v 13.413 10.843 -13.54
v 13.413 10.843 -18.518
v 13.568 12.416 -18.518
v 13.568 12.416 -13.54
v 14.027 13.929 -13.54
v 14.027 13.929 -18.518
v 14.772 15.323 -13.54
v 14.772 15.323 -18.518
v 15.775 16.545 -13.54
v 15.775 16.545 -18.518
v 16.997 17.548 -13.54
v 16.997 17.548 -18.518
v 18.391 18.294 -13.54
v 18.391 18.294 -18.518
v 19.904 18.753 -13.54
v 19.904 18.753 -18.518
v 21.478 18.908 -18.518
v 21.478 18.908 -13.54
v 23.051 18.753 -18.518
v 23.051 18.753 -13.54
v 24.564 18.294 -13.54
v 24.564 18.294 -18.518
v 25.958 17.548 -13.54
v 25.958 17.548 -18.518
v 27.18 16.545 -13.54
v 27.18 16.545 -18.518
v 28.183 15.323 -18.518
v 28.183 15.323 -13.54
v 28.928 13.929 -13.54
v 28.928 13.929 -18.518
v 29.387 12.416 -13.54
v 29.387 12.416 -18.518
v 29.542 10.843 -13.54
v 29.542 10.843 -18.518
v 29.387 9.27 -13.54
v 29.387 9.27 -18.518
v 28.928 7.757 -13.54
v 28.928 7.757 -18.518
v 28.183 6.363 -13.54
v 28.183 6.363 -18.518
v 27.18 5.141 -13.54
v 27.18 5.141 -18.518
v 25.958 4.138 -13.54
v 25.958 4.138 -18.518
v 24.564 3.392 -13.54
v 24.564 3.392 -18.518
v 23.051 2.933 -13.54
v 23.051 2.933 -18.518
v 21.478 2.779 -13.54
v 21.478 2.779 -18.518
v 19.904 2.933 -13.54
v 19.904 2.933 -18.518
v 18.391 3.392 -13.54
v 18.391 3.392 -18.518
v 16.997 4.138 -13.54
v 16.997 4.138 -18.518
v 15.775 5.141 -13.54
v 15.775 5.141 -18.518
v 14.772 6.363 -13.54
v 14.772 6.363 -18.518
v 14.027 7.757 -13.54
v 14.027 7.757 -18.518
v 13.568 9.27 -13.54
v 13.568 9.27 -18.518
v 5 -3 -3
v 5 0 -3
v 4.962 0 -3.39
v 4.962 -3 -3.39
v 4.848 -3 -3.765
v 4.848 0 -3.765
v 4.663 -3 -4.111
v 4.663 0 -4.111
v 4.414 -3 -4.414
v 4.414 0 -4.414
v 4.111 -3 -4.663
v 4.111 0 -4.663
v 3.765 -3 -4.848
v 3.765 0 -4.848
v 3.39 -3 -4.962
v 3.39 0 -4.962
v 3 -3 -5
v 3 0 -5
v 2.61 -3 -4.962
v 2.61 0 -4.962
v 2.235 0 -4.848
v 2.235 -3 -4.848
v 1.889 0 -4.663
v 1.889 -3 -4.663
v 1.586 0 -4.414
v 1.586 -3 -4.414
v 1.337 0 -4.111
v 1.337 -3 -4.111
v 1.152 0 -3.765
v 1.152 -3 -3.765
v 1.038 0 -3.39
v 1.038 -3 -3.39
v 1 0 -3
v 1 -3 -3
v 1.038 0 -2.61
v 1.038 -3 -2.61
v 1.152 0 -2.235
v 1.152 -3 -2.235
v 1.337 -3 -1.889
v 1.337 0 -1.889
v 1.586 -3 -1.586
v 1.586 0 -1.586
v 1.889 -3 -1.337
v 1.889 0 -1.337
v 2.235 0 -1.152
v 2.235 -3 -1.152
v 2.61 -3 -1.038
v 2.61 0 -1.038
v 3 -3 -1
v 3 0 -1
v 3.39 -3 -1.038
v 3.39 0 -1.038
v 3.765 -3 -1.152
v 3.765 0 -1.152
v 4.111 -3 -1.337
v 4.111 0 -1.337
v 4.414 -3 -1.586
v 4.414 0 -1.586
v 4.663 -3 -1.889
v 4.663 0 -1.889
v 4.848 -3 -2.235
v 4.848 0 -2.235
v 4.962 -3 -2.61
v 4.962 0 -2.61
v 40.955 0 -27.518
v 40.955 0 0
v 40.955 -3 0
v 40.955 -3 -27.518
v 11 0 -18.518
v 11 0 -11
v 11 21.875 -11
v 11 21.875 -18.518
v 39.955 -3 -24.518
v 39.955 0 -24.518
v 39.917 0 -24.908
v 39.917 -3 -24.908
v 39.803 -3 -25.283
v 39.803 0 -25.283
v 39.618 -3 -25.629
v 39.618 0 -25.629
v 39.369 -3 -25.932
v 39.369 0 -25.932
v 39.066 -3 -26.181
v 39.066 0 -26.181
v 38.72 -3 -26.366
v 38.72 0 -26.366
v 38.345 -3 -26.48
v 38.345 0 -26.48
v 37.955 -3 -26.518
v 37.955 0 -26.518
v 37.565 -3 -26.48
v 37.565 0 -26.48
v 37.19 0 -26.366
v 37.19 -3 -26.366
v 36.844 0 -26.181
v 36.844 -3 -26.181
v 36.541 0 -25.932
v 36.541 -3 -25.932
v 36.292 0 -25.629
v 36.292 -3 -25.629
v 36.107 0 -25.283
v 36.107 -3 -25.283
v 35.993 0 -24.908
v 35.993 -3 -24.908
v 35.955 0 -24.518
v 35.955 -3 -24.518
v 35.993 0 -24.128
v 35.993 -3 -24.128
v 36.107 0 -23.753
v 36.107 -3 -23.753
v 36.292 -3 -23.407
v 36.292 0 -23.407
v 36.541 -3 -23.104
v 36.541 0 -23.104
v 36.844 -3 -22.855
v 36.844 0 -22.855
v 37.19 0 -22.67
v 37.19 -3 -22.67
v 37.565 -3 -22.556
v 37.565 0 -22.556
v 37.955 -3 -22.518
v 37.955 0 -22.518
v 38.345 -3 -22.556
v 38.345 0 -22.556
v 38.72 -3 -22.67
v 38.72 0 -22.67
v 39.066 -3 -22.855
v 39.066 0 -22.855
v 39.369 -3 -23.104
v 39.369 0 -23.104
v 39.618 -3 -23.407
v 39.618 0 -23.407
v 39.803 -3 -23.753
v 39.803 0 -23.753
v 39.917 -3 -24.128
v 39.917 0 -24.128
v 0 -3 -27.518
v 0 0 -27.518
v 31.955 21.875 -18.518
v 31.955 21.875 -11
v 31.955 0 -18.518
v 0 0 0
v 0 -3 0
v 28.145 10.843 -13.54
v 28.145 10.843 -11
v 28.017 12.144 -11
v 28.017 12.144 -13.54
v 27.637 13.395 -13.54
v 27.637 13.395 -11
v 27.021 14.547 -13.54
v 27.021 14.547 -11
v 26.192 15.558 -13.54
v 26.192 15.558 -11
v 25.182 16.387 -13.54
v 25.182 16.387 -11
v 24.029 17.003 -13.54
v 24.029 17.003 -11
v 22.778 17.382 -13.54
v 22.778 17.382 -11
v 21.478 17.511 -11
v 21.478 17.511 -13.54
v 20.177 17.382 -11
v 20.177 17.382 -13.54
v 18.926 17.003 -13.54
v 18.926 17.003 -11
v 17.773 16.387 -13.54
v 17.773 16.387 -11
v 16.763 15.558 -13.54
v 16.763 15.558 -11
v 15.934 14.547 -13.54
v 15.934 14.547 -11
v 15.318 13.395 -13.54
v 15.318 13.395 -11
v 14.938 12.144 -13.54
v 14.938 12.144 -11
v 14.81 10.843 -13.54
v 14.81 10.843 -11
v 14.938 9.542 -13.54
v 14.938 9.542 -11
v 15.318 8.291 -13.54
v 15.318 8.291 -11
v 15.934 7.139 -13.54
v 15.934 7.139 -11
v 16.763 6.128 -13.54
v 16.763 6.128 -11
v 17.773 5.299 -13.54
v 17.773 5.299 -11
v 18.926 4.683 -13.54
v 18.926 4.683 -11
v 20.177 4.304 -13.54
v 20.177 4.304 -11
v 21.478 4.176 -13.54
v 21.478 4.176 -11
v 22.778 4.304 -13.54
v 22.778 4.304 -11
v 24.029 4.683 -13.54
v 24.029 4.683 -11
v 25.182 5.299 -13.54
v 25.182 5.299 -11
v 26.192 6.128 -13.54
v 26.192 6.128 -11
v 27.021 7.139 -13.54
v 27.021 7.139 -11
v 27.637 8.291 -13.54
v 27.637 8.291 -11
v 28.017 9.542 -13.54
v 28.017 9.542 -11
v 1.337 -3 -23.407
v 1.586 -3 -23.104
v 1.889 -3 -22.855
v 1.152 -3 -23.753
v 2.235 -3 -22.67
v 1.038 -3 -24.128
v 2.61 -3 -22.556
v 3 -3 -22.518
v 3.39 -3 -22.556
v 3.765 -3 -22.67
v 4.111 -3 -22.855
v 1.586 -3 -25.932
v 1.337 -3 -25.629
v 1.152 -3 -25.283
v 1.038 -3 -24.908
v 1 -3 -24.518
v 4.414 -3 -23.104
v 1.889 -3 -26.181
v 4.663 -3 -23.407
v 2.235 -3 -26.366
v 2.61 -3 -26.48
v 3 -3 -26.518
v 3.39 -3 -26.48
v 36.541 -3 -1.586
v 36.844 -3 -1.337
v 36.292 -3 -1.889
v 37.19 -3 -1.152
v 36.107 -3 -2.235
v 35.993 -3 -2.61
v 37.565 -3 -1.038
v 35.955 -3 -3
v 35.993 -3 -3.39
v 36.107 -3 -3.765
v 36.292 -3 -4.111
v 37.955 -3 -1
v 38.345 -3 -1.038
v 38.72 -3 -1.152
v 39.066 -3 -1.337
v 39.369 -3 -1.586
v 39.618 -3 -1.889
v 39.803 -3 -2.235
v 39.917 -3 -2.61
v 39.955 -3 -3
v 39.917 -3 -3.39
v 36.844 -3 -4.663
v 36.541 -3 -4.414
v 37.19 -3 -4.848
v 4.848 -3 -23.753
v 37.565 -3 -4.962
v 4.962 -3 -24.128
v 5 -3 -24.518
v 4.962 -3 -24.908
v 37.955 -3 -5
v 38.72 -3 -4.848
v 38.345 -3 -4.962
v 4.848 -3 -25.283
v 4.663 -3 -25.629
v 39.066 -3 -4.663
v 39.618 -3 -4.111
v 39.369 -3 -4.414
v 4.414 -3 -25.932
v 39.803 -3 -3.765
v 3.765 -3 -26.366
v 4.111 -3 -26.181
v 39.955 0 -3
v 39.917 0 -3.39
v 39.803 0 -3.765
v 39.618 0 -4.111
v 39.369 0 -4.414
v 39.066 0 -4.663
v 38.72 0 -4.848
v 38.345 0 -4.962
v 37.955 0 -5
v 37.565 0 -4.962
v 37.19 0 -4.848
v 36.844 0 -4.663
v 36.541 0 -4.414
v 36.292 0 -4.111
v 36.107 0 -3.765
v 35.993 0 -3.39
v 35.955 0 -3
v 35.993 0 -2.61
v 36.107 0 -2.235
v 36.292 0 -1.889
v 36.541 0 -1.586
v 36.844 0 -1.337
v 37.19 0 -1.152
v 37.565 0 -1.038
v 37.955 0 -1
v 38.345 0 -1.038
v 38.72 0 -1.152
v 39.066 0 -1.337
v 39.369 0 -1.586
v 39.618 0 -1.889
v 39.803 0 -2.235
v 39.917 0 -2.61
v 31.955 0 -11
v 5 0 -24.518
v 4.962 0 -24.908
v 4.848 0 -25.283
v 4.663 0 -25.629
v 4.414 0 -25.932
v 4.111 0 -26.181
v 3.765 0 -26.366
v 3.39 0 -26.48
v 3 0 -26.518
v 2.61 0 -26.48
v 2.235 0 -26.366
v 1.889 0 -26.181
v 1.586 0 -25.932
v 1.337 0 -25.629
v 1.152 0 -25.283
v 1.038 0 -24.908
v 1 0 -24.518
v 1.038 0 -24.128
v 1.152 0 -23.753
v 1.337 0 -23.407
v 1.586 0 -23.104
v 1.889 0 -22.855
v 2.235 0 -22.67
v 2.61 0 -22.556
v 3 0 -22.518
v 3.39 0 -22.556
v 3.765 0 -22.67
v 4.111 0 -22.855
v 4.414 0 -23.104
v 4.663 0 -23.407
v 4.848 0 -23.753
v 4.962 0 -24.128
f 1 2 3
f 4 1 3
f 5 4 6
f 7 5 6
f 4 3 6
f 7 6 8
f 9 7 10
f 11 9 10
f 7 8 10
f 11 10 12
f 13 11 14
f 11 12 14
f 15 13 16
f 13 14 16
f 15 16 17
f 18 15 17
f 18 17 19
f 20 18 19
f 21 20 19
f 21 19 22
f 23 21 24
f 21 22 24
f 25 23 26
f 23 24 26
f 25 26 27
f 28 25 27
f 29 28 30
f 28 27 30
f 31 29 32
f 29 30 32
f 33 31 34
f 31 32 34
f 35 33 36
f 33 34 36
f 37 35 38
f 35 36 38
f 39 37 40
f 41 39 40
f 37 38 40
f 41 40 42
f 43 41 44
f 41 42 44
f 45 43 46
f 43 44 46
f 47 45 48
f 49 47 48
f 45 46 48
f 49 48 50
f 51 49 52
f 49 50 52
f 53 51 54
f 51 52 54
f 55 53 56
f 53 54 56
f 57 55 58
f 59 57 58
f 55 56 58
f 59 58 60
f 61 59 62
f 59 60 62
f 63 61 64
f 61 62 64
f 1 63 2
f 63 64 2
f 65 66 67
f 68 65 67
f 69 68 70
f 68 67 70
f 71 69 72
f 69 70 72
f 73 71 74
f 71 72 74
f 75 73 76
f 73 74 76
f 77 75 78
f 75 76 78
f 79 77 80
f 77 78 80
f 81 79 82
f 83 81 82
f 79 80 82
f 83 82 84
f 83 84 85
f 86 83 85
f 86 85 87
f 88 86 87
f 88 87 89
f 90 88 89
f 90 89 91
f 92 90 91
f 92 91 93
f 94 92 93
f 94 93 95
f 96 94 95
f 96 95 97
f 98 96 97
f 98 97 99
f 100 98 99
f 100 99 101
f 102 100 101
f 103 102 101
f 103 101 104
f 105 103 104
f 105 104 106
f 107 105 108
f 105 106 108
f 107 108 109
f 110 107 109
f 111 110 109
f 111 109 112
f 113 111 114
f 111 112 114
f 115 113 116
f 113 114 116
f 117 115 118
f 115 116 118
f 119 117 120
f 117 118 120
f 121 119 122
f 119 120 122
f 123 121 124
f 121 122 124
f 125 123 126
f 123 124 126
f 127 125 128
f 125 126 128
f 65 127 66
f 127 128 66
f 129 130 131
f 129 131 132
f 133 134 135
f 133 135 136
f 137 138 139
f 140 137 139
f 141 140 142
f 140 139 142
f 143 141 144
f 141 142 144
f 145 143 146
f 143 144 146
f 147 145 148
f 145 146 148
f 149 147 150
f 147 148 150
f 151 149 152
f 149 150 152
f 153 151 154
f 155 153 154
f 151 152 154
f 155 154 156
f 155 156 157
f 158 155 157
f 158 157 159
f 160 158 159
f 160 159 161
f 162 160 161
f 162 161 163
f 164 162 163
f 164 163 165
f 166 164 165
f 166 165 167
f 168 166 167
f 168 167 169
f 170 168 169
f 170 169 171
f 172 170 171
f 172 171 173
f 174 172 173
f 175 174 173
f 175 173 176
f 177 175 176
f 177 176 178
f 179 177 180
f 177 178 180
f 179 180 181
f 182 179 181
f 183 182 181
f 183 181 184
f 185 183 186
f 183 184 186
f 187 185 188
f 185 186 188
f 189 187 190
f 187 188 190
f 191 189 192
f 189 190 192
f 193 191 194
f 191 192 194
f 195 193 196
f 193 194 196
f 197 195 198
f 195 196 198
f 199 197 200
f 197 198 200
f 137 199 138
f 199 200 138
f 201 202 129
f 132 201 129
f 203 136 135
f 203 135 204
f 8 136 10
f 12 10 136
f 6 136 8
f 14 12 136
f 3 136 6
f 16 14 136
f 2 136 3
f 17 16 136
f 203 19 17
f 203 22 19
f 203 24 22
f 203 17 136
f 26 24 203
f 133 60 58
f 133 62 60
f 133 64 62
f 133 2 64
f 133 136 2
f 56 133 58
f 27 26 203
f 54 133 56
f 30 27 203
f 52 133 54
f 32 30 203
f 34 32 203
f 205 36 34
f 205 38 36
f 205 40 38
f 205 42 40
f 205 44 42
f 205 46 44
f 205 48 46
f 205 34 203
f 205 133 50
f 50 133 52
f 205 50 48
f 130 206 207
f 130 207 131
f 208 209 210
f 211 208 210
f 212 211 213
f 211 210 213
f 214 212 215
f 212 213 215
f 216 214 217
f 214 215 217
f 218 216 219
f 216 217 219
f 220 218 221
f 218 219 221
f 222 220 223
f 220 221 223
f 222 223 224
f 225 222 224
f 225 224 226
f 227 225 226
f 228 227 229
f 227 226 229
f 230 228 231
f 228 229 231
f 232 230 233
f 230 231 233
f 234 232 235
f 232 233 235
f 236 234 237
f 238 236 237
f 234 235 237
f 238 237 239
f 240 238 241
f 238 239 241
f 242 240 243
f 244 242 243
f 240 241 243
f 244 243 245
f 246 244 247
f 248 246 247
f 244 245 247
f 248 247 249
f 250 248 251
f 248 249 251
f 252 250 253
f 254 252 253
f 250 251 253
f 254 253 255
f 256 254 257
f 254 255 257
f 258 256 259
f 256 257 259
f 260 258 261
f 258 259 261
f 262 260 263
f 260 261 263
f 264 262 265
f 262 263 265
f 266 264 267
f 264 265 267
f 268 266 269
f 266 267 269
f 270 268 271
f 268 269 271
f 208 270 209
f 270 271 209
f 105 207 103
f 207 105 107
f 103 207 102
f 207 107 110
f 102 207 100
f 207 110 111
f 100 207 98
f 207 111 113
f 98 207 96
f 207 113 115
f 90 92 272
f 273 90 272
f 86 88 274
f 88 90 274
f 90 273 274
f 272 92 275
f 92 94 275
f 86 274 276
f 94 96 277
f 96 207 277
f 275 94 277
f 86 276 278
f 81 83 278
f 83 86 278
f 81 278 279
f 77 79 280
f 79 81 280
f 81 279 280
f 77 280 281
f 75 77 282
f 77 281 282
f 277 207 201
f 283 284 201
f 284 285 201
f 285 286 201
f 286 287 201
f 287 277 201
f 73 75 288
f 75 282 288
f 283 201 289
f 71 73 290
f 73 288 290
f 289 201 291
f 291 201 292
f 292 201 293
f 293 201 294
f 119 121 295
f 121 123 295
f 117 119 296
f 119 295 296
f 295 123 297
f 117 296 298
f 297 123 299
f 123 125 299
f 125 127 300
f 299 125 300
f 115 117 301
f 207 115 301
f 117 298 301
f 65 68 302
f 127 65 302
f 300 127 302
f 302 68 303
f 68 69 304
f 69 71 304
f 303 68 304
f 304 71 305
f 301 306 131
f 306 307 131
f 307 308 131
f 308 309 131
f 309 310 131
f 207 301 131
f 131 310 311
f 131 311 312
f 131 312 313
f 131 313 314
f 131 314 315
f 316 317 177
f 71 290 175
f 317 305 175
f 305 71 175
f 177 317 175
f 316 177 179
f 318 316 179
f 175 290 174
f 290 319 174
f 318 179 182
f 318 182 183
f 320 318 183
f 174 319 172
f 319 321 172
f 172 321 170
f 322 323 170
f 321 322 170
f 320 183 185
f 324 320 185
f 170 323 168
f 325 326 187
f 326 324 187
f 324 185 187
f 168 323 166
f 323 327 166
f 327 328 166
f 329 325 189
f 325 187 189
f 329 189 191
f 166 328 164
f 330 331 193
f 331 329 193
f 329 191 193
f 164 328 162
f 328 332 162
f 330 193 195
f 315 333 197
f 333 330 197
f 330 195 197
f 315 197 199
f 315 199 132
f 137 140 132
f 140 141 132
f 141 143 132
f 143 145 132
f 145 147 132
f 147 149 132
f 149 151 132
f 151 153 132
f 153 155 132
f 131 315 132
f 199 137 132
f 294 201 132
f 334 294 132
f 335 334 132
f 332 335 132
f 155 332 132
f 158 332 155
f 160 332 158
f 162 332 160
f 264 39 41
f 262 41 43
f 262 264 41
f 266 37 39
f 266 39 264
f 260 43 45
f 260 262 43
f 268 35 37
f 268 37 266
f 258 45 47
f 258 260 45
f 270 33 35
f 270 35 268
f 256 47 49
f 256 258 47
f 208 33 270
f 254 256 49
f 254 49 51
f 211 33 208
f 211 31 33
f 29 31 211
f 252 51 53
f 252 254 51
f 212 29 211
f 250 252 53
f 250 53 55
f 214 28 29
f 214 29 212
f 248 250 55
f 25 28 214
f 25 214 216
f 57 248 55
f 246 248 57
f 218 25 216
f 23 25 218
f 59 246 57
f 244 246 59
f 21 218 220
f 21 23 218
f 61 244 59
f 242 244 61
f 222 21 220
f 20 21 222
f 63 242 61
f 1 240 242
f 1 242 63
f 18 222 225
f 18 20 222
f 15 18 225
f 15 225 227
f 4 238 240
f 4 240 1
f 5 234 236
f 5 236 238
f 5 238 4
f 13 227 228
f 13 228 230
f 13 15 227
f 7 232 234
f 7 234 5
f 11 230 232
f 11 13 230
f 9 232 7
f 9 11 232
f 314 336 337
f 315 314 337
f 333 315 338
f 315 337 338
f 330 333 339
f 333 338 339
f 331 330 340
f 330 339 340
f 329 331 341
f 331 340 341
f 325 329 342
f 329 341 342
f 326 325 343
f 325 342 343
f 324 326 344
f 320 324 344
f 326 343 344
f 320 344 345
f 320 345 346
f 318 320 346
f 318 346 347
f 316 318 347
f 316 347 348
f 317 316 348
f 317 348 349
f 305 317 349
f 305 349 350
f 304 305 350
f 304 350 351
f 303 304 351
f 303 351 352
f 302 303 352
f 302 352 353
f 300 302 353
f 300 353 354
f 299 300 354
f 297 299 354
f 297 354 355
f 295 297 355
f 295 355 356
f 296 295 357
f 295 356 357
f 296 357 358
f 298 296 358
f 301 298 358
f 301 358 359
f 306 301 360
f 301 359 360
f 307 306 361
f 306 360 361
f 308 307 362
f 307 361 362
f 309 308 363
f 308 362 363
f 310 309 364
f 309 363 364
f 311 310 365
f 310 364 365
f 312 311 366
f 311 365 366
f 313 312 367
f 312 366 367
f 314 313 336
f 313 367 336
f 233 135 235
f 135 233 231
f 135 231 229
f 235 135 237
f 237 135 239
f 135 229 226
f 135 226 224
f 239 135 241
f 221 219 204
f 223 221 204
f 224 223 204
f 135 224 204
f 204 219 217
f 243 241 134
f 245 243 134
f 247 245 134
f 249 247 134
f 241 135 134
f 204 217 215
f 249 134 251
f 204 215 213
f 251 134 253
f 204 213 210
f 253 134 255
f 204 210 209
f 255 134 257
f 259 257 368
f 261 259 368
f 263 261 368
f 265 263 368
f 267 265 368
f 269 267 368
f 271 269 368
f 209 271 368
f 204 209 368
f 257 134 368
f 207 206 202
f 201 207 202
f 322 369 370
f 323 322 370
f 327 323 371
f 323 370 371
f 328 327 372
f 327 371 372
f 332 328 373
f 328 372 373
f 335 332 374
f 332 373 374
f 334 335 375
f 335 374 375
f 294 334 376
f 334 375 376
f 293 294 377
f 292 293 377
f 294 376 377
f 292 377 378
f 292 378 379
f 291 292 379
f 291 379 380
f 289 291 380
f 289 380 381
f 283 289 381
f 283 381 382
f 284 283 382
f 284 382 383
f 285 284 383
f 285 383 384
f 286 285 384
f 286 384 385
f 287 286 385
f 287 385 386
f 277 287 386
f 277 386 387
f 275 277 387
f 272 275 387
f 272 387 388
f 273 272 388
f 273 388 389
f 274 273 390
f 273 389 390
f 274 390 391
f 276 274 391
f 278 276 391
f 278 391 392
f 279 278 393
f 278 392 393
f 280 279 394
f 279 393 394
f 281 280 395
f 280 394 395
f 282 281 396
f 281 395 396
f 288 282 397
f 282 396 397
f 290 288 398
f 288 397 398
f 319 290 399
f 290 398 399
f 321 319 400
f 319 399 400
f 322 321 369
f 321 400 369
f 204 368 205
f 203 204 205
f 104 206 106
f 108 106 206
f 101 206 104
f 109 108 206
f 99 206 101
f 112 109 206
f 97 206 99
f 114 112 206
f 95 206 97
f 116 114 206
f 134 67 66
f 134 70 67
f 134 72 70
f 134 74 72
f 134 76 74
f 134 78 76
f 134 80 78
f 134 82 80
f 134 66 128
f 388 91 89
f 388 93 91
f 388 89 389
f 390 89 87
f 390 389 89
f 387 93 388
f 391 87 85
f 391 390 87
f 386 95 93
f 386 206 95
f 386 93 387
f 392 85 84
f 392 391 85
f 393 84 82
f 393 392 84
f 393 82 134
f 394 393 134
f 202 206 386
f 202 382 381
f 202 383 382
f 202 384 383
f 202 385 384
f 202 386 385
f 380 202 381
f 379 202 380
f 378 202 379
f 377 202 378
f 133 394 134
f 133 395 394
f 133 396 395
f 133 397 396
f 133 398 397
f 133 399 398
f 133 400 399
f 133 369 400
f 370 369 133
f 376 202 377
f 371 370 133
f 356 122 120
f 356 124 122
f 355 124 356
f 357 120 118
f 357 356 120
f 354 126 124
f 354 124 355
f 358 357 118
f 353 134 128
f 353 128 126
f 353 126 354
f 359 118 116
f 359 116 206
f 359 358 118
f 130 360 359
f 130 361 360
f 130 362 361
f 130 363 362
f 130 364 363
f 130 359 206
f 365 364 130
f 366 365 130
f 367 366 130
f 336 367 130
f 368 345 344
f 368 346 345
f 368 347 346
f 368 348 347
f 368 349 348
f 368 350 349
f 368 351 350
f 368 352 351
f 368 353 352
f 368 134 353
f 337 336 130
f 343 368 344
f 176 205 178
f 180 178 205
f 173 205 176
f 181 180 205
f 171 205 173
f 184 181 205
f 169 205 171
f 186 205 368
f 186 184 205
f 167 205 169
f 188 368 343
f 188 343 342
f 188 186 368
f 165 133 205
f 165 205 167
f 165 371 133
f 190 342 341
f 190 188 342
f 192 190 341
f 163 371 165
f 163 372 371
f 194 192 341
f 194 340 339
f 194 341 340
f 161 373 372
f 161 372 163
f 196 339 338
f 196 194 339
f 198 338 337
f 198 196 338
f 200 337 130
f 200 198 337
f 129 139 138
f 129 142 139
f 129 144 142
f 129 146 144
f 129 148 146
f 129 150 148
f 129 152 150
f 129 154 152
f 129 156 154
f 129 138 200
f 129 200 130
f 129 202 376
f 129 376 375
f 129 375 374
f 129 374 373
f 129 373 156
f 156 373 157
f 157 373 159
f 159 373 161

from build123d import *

# Parameters (mm, degrees)
SKETCH1_W           = 40.954999878
SKETCH1_H           = 27.518000082
BOSS_EXTRUDE1_DEPTH = 2.999994
SKETCH3_W           = 20.955
SKETCH3_H           = 7.5184
BOSS_EXTRUDE2_DEPTH = 21.874999989
SKETCH4_R           = 1.999996
CUT_EXTRUDE1_DEPTH  = 3.999994
SKETCH5_R           = 6.6675
CUT_EXTRUDE2_DEPTH  = 2.54
SKETCH6_R           = 8.0645
CUT_EXTRUDE3_DEPTH  = 4.9784


with BuildPart() as part:
    # Sketch1 → Boss-Extrude1 (new body)
    with BuildSketch(Plane(origin=(0, 0, 0), x_dir=(1, 0, 0), z_dir=(0, 1, 0))):
        with Locations((20.477499939, 13.759000041)):
            Rectangle(SKETCH1_W, SKETCH1_H)
    extrude(amount=-BOSS_EXTRUDE1_DEPTH)

    # Sketch3 → Boss-Extrude2 (add)
    with BuildSketch(Plane(origin=(0, 0, 0), x_dir=(1, 0, 0), z_dir=(0, 1, 0))):
        with Locations((21.4775034, 14.7592034)):
            Rectangle(SKETCH3_W, SKETCH3_H)
    extrude(amount=BOSS_EXTRUDE2_DEPTH)

    # Sketch4 → Cut-Extrude1 (cut, through all)
    with BuildSketch(Plane(origin=(0, 0, 0), x_dir=(1, 0, 0), z_dir=(0, 1, 0))):
        with Locations((2.999994, 24.518006082)):
            Circle(SKETCH4_R)
        with Locations((2.999994, 2.999994)):
            Circle(SKETCH4_R)
        with Locations((37.955005756, 2.999994)):
            Circle(SKETCH4_R)
        with Locations((37.955005756, 24.518006082)):
            Circle(SKETCH4_R)
    extrude(amount=-CUT_EXTRUDE1_DEPTH, mode=Mode.SUBTRACT)

    # Sketch5 → Cut-Extrude2 (cut)
    with BuildSketch(Plane.XY.offset(-11.0000034)):
        with Locations((21.4775034, 10.843006)):
            Circle(SKETCH5_R)
    extrude(amount=-CUT_EXTRUDE2_DEPTH, mode=Mode.SUBTRACT)

    # Sketch6 → Cut-Extrude3 (cut)
    with BuildSketch(Plane(origin=(0, 0, -18.5184034), x_dir=(-1, 0, 0), z_dir=(0, 0, -1))):
        with Locations((-21.4775034, 10.843006)):
            Circle(SKETCH6_R)
    extrude(amount=-CUT_EXTRUDE3_DEPTH, mode=Mode.SUBTRACT)


solid = part.part
